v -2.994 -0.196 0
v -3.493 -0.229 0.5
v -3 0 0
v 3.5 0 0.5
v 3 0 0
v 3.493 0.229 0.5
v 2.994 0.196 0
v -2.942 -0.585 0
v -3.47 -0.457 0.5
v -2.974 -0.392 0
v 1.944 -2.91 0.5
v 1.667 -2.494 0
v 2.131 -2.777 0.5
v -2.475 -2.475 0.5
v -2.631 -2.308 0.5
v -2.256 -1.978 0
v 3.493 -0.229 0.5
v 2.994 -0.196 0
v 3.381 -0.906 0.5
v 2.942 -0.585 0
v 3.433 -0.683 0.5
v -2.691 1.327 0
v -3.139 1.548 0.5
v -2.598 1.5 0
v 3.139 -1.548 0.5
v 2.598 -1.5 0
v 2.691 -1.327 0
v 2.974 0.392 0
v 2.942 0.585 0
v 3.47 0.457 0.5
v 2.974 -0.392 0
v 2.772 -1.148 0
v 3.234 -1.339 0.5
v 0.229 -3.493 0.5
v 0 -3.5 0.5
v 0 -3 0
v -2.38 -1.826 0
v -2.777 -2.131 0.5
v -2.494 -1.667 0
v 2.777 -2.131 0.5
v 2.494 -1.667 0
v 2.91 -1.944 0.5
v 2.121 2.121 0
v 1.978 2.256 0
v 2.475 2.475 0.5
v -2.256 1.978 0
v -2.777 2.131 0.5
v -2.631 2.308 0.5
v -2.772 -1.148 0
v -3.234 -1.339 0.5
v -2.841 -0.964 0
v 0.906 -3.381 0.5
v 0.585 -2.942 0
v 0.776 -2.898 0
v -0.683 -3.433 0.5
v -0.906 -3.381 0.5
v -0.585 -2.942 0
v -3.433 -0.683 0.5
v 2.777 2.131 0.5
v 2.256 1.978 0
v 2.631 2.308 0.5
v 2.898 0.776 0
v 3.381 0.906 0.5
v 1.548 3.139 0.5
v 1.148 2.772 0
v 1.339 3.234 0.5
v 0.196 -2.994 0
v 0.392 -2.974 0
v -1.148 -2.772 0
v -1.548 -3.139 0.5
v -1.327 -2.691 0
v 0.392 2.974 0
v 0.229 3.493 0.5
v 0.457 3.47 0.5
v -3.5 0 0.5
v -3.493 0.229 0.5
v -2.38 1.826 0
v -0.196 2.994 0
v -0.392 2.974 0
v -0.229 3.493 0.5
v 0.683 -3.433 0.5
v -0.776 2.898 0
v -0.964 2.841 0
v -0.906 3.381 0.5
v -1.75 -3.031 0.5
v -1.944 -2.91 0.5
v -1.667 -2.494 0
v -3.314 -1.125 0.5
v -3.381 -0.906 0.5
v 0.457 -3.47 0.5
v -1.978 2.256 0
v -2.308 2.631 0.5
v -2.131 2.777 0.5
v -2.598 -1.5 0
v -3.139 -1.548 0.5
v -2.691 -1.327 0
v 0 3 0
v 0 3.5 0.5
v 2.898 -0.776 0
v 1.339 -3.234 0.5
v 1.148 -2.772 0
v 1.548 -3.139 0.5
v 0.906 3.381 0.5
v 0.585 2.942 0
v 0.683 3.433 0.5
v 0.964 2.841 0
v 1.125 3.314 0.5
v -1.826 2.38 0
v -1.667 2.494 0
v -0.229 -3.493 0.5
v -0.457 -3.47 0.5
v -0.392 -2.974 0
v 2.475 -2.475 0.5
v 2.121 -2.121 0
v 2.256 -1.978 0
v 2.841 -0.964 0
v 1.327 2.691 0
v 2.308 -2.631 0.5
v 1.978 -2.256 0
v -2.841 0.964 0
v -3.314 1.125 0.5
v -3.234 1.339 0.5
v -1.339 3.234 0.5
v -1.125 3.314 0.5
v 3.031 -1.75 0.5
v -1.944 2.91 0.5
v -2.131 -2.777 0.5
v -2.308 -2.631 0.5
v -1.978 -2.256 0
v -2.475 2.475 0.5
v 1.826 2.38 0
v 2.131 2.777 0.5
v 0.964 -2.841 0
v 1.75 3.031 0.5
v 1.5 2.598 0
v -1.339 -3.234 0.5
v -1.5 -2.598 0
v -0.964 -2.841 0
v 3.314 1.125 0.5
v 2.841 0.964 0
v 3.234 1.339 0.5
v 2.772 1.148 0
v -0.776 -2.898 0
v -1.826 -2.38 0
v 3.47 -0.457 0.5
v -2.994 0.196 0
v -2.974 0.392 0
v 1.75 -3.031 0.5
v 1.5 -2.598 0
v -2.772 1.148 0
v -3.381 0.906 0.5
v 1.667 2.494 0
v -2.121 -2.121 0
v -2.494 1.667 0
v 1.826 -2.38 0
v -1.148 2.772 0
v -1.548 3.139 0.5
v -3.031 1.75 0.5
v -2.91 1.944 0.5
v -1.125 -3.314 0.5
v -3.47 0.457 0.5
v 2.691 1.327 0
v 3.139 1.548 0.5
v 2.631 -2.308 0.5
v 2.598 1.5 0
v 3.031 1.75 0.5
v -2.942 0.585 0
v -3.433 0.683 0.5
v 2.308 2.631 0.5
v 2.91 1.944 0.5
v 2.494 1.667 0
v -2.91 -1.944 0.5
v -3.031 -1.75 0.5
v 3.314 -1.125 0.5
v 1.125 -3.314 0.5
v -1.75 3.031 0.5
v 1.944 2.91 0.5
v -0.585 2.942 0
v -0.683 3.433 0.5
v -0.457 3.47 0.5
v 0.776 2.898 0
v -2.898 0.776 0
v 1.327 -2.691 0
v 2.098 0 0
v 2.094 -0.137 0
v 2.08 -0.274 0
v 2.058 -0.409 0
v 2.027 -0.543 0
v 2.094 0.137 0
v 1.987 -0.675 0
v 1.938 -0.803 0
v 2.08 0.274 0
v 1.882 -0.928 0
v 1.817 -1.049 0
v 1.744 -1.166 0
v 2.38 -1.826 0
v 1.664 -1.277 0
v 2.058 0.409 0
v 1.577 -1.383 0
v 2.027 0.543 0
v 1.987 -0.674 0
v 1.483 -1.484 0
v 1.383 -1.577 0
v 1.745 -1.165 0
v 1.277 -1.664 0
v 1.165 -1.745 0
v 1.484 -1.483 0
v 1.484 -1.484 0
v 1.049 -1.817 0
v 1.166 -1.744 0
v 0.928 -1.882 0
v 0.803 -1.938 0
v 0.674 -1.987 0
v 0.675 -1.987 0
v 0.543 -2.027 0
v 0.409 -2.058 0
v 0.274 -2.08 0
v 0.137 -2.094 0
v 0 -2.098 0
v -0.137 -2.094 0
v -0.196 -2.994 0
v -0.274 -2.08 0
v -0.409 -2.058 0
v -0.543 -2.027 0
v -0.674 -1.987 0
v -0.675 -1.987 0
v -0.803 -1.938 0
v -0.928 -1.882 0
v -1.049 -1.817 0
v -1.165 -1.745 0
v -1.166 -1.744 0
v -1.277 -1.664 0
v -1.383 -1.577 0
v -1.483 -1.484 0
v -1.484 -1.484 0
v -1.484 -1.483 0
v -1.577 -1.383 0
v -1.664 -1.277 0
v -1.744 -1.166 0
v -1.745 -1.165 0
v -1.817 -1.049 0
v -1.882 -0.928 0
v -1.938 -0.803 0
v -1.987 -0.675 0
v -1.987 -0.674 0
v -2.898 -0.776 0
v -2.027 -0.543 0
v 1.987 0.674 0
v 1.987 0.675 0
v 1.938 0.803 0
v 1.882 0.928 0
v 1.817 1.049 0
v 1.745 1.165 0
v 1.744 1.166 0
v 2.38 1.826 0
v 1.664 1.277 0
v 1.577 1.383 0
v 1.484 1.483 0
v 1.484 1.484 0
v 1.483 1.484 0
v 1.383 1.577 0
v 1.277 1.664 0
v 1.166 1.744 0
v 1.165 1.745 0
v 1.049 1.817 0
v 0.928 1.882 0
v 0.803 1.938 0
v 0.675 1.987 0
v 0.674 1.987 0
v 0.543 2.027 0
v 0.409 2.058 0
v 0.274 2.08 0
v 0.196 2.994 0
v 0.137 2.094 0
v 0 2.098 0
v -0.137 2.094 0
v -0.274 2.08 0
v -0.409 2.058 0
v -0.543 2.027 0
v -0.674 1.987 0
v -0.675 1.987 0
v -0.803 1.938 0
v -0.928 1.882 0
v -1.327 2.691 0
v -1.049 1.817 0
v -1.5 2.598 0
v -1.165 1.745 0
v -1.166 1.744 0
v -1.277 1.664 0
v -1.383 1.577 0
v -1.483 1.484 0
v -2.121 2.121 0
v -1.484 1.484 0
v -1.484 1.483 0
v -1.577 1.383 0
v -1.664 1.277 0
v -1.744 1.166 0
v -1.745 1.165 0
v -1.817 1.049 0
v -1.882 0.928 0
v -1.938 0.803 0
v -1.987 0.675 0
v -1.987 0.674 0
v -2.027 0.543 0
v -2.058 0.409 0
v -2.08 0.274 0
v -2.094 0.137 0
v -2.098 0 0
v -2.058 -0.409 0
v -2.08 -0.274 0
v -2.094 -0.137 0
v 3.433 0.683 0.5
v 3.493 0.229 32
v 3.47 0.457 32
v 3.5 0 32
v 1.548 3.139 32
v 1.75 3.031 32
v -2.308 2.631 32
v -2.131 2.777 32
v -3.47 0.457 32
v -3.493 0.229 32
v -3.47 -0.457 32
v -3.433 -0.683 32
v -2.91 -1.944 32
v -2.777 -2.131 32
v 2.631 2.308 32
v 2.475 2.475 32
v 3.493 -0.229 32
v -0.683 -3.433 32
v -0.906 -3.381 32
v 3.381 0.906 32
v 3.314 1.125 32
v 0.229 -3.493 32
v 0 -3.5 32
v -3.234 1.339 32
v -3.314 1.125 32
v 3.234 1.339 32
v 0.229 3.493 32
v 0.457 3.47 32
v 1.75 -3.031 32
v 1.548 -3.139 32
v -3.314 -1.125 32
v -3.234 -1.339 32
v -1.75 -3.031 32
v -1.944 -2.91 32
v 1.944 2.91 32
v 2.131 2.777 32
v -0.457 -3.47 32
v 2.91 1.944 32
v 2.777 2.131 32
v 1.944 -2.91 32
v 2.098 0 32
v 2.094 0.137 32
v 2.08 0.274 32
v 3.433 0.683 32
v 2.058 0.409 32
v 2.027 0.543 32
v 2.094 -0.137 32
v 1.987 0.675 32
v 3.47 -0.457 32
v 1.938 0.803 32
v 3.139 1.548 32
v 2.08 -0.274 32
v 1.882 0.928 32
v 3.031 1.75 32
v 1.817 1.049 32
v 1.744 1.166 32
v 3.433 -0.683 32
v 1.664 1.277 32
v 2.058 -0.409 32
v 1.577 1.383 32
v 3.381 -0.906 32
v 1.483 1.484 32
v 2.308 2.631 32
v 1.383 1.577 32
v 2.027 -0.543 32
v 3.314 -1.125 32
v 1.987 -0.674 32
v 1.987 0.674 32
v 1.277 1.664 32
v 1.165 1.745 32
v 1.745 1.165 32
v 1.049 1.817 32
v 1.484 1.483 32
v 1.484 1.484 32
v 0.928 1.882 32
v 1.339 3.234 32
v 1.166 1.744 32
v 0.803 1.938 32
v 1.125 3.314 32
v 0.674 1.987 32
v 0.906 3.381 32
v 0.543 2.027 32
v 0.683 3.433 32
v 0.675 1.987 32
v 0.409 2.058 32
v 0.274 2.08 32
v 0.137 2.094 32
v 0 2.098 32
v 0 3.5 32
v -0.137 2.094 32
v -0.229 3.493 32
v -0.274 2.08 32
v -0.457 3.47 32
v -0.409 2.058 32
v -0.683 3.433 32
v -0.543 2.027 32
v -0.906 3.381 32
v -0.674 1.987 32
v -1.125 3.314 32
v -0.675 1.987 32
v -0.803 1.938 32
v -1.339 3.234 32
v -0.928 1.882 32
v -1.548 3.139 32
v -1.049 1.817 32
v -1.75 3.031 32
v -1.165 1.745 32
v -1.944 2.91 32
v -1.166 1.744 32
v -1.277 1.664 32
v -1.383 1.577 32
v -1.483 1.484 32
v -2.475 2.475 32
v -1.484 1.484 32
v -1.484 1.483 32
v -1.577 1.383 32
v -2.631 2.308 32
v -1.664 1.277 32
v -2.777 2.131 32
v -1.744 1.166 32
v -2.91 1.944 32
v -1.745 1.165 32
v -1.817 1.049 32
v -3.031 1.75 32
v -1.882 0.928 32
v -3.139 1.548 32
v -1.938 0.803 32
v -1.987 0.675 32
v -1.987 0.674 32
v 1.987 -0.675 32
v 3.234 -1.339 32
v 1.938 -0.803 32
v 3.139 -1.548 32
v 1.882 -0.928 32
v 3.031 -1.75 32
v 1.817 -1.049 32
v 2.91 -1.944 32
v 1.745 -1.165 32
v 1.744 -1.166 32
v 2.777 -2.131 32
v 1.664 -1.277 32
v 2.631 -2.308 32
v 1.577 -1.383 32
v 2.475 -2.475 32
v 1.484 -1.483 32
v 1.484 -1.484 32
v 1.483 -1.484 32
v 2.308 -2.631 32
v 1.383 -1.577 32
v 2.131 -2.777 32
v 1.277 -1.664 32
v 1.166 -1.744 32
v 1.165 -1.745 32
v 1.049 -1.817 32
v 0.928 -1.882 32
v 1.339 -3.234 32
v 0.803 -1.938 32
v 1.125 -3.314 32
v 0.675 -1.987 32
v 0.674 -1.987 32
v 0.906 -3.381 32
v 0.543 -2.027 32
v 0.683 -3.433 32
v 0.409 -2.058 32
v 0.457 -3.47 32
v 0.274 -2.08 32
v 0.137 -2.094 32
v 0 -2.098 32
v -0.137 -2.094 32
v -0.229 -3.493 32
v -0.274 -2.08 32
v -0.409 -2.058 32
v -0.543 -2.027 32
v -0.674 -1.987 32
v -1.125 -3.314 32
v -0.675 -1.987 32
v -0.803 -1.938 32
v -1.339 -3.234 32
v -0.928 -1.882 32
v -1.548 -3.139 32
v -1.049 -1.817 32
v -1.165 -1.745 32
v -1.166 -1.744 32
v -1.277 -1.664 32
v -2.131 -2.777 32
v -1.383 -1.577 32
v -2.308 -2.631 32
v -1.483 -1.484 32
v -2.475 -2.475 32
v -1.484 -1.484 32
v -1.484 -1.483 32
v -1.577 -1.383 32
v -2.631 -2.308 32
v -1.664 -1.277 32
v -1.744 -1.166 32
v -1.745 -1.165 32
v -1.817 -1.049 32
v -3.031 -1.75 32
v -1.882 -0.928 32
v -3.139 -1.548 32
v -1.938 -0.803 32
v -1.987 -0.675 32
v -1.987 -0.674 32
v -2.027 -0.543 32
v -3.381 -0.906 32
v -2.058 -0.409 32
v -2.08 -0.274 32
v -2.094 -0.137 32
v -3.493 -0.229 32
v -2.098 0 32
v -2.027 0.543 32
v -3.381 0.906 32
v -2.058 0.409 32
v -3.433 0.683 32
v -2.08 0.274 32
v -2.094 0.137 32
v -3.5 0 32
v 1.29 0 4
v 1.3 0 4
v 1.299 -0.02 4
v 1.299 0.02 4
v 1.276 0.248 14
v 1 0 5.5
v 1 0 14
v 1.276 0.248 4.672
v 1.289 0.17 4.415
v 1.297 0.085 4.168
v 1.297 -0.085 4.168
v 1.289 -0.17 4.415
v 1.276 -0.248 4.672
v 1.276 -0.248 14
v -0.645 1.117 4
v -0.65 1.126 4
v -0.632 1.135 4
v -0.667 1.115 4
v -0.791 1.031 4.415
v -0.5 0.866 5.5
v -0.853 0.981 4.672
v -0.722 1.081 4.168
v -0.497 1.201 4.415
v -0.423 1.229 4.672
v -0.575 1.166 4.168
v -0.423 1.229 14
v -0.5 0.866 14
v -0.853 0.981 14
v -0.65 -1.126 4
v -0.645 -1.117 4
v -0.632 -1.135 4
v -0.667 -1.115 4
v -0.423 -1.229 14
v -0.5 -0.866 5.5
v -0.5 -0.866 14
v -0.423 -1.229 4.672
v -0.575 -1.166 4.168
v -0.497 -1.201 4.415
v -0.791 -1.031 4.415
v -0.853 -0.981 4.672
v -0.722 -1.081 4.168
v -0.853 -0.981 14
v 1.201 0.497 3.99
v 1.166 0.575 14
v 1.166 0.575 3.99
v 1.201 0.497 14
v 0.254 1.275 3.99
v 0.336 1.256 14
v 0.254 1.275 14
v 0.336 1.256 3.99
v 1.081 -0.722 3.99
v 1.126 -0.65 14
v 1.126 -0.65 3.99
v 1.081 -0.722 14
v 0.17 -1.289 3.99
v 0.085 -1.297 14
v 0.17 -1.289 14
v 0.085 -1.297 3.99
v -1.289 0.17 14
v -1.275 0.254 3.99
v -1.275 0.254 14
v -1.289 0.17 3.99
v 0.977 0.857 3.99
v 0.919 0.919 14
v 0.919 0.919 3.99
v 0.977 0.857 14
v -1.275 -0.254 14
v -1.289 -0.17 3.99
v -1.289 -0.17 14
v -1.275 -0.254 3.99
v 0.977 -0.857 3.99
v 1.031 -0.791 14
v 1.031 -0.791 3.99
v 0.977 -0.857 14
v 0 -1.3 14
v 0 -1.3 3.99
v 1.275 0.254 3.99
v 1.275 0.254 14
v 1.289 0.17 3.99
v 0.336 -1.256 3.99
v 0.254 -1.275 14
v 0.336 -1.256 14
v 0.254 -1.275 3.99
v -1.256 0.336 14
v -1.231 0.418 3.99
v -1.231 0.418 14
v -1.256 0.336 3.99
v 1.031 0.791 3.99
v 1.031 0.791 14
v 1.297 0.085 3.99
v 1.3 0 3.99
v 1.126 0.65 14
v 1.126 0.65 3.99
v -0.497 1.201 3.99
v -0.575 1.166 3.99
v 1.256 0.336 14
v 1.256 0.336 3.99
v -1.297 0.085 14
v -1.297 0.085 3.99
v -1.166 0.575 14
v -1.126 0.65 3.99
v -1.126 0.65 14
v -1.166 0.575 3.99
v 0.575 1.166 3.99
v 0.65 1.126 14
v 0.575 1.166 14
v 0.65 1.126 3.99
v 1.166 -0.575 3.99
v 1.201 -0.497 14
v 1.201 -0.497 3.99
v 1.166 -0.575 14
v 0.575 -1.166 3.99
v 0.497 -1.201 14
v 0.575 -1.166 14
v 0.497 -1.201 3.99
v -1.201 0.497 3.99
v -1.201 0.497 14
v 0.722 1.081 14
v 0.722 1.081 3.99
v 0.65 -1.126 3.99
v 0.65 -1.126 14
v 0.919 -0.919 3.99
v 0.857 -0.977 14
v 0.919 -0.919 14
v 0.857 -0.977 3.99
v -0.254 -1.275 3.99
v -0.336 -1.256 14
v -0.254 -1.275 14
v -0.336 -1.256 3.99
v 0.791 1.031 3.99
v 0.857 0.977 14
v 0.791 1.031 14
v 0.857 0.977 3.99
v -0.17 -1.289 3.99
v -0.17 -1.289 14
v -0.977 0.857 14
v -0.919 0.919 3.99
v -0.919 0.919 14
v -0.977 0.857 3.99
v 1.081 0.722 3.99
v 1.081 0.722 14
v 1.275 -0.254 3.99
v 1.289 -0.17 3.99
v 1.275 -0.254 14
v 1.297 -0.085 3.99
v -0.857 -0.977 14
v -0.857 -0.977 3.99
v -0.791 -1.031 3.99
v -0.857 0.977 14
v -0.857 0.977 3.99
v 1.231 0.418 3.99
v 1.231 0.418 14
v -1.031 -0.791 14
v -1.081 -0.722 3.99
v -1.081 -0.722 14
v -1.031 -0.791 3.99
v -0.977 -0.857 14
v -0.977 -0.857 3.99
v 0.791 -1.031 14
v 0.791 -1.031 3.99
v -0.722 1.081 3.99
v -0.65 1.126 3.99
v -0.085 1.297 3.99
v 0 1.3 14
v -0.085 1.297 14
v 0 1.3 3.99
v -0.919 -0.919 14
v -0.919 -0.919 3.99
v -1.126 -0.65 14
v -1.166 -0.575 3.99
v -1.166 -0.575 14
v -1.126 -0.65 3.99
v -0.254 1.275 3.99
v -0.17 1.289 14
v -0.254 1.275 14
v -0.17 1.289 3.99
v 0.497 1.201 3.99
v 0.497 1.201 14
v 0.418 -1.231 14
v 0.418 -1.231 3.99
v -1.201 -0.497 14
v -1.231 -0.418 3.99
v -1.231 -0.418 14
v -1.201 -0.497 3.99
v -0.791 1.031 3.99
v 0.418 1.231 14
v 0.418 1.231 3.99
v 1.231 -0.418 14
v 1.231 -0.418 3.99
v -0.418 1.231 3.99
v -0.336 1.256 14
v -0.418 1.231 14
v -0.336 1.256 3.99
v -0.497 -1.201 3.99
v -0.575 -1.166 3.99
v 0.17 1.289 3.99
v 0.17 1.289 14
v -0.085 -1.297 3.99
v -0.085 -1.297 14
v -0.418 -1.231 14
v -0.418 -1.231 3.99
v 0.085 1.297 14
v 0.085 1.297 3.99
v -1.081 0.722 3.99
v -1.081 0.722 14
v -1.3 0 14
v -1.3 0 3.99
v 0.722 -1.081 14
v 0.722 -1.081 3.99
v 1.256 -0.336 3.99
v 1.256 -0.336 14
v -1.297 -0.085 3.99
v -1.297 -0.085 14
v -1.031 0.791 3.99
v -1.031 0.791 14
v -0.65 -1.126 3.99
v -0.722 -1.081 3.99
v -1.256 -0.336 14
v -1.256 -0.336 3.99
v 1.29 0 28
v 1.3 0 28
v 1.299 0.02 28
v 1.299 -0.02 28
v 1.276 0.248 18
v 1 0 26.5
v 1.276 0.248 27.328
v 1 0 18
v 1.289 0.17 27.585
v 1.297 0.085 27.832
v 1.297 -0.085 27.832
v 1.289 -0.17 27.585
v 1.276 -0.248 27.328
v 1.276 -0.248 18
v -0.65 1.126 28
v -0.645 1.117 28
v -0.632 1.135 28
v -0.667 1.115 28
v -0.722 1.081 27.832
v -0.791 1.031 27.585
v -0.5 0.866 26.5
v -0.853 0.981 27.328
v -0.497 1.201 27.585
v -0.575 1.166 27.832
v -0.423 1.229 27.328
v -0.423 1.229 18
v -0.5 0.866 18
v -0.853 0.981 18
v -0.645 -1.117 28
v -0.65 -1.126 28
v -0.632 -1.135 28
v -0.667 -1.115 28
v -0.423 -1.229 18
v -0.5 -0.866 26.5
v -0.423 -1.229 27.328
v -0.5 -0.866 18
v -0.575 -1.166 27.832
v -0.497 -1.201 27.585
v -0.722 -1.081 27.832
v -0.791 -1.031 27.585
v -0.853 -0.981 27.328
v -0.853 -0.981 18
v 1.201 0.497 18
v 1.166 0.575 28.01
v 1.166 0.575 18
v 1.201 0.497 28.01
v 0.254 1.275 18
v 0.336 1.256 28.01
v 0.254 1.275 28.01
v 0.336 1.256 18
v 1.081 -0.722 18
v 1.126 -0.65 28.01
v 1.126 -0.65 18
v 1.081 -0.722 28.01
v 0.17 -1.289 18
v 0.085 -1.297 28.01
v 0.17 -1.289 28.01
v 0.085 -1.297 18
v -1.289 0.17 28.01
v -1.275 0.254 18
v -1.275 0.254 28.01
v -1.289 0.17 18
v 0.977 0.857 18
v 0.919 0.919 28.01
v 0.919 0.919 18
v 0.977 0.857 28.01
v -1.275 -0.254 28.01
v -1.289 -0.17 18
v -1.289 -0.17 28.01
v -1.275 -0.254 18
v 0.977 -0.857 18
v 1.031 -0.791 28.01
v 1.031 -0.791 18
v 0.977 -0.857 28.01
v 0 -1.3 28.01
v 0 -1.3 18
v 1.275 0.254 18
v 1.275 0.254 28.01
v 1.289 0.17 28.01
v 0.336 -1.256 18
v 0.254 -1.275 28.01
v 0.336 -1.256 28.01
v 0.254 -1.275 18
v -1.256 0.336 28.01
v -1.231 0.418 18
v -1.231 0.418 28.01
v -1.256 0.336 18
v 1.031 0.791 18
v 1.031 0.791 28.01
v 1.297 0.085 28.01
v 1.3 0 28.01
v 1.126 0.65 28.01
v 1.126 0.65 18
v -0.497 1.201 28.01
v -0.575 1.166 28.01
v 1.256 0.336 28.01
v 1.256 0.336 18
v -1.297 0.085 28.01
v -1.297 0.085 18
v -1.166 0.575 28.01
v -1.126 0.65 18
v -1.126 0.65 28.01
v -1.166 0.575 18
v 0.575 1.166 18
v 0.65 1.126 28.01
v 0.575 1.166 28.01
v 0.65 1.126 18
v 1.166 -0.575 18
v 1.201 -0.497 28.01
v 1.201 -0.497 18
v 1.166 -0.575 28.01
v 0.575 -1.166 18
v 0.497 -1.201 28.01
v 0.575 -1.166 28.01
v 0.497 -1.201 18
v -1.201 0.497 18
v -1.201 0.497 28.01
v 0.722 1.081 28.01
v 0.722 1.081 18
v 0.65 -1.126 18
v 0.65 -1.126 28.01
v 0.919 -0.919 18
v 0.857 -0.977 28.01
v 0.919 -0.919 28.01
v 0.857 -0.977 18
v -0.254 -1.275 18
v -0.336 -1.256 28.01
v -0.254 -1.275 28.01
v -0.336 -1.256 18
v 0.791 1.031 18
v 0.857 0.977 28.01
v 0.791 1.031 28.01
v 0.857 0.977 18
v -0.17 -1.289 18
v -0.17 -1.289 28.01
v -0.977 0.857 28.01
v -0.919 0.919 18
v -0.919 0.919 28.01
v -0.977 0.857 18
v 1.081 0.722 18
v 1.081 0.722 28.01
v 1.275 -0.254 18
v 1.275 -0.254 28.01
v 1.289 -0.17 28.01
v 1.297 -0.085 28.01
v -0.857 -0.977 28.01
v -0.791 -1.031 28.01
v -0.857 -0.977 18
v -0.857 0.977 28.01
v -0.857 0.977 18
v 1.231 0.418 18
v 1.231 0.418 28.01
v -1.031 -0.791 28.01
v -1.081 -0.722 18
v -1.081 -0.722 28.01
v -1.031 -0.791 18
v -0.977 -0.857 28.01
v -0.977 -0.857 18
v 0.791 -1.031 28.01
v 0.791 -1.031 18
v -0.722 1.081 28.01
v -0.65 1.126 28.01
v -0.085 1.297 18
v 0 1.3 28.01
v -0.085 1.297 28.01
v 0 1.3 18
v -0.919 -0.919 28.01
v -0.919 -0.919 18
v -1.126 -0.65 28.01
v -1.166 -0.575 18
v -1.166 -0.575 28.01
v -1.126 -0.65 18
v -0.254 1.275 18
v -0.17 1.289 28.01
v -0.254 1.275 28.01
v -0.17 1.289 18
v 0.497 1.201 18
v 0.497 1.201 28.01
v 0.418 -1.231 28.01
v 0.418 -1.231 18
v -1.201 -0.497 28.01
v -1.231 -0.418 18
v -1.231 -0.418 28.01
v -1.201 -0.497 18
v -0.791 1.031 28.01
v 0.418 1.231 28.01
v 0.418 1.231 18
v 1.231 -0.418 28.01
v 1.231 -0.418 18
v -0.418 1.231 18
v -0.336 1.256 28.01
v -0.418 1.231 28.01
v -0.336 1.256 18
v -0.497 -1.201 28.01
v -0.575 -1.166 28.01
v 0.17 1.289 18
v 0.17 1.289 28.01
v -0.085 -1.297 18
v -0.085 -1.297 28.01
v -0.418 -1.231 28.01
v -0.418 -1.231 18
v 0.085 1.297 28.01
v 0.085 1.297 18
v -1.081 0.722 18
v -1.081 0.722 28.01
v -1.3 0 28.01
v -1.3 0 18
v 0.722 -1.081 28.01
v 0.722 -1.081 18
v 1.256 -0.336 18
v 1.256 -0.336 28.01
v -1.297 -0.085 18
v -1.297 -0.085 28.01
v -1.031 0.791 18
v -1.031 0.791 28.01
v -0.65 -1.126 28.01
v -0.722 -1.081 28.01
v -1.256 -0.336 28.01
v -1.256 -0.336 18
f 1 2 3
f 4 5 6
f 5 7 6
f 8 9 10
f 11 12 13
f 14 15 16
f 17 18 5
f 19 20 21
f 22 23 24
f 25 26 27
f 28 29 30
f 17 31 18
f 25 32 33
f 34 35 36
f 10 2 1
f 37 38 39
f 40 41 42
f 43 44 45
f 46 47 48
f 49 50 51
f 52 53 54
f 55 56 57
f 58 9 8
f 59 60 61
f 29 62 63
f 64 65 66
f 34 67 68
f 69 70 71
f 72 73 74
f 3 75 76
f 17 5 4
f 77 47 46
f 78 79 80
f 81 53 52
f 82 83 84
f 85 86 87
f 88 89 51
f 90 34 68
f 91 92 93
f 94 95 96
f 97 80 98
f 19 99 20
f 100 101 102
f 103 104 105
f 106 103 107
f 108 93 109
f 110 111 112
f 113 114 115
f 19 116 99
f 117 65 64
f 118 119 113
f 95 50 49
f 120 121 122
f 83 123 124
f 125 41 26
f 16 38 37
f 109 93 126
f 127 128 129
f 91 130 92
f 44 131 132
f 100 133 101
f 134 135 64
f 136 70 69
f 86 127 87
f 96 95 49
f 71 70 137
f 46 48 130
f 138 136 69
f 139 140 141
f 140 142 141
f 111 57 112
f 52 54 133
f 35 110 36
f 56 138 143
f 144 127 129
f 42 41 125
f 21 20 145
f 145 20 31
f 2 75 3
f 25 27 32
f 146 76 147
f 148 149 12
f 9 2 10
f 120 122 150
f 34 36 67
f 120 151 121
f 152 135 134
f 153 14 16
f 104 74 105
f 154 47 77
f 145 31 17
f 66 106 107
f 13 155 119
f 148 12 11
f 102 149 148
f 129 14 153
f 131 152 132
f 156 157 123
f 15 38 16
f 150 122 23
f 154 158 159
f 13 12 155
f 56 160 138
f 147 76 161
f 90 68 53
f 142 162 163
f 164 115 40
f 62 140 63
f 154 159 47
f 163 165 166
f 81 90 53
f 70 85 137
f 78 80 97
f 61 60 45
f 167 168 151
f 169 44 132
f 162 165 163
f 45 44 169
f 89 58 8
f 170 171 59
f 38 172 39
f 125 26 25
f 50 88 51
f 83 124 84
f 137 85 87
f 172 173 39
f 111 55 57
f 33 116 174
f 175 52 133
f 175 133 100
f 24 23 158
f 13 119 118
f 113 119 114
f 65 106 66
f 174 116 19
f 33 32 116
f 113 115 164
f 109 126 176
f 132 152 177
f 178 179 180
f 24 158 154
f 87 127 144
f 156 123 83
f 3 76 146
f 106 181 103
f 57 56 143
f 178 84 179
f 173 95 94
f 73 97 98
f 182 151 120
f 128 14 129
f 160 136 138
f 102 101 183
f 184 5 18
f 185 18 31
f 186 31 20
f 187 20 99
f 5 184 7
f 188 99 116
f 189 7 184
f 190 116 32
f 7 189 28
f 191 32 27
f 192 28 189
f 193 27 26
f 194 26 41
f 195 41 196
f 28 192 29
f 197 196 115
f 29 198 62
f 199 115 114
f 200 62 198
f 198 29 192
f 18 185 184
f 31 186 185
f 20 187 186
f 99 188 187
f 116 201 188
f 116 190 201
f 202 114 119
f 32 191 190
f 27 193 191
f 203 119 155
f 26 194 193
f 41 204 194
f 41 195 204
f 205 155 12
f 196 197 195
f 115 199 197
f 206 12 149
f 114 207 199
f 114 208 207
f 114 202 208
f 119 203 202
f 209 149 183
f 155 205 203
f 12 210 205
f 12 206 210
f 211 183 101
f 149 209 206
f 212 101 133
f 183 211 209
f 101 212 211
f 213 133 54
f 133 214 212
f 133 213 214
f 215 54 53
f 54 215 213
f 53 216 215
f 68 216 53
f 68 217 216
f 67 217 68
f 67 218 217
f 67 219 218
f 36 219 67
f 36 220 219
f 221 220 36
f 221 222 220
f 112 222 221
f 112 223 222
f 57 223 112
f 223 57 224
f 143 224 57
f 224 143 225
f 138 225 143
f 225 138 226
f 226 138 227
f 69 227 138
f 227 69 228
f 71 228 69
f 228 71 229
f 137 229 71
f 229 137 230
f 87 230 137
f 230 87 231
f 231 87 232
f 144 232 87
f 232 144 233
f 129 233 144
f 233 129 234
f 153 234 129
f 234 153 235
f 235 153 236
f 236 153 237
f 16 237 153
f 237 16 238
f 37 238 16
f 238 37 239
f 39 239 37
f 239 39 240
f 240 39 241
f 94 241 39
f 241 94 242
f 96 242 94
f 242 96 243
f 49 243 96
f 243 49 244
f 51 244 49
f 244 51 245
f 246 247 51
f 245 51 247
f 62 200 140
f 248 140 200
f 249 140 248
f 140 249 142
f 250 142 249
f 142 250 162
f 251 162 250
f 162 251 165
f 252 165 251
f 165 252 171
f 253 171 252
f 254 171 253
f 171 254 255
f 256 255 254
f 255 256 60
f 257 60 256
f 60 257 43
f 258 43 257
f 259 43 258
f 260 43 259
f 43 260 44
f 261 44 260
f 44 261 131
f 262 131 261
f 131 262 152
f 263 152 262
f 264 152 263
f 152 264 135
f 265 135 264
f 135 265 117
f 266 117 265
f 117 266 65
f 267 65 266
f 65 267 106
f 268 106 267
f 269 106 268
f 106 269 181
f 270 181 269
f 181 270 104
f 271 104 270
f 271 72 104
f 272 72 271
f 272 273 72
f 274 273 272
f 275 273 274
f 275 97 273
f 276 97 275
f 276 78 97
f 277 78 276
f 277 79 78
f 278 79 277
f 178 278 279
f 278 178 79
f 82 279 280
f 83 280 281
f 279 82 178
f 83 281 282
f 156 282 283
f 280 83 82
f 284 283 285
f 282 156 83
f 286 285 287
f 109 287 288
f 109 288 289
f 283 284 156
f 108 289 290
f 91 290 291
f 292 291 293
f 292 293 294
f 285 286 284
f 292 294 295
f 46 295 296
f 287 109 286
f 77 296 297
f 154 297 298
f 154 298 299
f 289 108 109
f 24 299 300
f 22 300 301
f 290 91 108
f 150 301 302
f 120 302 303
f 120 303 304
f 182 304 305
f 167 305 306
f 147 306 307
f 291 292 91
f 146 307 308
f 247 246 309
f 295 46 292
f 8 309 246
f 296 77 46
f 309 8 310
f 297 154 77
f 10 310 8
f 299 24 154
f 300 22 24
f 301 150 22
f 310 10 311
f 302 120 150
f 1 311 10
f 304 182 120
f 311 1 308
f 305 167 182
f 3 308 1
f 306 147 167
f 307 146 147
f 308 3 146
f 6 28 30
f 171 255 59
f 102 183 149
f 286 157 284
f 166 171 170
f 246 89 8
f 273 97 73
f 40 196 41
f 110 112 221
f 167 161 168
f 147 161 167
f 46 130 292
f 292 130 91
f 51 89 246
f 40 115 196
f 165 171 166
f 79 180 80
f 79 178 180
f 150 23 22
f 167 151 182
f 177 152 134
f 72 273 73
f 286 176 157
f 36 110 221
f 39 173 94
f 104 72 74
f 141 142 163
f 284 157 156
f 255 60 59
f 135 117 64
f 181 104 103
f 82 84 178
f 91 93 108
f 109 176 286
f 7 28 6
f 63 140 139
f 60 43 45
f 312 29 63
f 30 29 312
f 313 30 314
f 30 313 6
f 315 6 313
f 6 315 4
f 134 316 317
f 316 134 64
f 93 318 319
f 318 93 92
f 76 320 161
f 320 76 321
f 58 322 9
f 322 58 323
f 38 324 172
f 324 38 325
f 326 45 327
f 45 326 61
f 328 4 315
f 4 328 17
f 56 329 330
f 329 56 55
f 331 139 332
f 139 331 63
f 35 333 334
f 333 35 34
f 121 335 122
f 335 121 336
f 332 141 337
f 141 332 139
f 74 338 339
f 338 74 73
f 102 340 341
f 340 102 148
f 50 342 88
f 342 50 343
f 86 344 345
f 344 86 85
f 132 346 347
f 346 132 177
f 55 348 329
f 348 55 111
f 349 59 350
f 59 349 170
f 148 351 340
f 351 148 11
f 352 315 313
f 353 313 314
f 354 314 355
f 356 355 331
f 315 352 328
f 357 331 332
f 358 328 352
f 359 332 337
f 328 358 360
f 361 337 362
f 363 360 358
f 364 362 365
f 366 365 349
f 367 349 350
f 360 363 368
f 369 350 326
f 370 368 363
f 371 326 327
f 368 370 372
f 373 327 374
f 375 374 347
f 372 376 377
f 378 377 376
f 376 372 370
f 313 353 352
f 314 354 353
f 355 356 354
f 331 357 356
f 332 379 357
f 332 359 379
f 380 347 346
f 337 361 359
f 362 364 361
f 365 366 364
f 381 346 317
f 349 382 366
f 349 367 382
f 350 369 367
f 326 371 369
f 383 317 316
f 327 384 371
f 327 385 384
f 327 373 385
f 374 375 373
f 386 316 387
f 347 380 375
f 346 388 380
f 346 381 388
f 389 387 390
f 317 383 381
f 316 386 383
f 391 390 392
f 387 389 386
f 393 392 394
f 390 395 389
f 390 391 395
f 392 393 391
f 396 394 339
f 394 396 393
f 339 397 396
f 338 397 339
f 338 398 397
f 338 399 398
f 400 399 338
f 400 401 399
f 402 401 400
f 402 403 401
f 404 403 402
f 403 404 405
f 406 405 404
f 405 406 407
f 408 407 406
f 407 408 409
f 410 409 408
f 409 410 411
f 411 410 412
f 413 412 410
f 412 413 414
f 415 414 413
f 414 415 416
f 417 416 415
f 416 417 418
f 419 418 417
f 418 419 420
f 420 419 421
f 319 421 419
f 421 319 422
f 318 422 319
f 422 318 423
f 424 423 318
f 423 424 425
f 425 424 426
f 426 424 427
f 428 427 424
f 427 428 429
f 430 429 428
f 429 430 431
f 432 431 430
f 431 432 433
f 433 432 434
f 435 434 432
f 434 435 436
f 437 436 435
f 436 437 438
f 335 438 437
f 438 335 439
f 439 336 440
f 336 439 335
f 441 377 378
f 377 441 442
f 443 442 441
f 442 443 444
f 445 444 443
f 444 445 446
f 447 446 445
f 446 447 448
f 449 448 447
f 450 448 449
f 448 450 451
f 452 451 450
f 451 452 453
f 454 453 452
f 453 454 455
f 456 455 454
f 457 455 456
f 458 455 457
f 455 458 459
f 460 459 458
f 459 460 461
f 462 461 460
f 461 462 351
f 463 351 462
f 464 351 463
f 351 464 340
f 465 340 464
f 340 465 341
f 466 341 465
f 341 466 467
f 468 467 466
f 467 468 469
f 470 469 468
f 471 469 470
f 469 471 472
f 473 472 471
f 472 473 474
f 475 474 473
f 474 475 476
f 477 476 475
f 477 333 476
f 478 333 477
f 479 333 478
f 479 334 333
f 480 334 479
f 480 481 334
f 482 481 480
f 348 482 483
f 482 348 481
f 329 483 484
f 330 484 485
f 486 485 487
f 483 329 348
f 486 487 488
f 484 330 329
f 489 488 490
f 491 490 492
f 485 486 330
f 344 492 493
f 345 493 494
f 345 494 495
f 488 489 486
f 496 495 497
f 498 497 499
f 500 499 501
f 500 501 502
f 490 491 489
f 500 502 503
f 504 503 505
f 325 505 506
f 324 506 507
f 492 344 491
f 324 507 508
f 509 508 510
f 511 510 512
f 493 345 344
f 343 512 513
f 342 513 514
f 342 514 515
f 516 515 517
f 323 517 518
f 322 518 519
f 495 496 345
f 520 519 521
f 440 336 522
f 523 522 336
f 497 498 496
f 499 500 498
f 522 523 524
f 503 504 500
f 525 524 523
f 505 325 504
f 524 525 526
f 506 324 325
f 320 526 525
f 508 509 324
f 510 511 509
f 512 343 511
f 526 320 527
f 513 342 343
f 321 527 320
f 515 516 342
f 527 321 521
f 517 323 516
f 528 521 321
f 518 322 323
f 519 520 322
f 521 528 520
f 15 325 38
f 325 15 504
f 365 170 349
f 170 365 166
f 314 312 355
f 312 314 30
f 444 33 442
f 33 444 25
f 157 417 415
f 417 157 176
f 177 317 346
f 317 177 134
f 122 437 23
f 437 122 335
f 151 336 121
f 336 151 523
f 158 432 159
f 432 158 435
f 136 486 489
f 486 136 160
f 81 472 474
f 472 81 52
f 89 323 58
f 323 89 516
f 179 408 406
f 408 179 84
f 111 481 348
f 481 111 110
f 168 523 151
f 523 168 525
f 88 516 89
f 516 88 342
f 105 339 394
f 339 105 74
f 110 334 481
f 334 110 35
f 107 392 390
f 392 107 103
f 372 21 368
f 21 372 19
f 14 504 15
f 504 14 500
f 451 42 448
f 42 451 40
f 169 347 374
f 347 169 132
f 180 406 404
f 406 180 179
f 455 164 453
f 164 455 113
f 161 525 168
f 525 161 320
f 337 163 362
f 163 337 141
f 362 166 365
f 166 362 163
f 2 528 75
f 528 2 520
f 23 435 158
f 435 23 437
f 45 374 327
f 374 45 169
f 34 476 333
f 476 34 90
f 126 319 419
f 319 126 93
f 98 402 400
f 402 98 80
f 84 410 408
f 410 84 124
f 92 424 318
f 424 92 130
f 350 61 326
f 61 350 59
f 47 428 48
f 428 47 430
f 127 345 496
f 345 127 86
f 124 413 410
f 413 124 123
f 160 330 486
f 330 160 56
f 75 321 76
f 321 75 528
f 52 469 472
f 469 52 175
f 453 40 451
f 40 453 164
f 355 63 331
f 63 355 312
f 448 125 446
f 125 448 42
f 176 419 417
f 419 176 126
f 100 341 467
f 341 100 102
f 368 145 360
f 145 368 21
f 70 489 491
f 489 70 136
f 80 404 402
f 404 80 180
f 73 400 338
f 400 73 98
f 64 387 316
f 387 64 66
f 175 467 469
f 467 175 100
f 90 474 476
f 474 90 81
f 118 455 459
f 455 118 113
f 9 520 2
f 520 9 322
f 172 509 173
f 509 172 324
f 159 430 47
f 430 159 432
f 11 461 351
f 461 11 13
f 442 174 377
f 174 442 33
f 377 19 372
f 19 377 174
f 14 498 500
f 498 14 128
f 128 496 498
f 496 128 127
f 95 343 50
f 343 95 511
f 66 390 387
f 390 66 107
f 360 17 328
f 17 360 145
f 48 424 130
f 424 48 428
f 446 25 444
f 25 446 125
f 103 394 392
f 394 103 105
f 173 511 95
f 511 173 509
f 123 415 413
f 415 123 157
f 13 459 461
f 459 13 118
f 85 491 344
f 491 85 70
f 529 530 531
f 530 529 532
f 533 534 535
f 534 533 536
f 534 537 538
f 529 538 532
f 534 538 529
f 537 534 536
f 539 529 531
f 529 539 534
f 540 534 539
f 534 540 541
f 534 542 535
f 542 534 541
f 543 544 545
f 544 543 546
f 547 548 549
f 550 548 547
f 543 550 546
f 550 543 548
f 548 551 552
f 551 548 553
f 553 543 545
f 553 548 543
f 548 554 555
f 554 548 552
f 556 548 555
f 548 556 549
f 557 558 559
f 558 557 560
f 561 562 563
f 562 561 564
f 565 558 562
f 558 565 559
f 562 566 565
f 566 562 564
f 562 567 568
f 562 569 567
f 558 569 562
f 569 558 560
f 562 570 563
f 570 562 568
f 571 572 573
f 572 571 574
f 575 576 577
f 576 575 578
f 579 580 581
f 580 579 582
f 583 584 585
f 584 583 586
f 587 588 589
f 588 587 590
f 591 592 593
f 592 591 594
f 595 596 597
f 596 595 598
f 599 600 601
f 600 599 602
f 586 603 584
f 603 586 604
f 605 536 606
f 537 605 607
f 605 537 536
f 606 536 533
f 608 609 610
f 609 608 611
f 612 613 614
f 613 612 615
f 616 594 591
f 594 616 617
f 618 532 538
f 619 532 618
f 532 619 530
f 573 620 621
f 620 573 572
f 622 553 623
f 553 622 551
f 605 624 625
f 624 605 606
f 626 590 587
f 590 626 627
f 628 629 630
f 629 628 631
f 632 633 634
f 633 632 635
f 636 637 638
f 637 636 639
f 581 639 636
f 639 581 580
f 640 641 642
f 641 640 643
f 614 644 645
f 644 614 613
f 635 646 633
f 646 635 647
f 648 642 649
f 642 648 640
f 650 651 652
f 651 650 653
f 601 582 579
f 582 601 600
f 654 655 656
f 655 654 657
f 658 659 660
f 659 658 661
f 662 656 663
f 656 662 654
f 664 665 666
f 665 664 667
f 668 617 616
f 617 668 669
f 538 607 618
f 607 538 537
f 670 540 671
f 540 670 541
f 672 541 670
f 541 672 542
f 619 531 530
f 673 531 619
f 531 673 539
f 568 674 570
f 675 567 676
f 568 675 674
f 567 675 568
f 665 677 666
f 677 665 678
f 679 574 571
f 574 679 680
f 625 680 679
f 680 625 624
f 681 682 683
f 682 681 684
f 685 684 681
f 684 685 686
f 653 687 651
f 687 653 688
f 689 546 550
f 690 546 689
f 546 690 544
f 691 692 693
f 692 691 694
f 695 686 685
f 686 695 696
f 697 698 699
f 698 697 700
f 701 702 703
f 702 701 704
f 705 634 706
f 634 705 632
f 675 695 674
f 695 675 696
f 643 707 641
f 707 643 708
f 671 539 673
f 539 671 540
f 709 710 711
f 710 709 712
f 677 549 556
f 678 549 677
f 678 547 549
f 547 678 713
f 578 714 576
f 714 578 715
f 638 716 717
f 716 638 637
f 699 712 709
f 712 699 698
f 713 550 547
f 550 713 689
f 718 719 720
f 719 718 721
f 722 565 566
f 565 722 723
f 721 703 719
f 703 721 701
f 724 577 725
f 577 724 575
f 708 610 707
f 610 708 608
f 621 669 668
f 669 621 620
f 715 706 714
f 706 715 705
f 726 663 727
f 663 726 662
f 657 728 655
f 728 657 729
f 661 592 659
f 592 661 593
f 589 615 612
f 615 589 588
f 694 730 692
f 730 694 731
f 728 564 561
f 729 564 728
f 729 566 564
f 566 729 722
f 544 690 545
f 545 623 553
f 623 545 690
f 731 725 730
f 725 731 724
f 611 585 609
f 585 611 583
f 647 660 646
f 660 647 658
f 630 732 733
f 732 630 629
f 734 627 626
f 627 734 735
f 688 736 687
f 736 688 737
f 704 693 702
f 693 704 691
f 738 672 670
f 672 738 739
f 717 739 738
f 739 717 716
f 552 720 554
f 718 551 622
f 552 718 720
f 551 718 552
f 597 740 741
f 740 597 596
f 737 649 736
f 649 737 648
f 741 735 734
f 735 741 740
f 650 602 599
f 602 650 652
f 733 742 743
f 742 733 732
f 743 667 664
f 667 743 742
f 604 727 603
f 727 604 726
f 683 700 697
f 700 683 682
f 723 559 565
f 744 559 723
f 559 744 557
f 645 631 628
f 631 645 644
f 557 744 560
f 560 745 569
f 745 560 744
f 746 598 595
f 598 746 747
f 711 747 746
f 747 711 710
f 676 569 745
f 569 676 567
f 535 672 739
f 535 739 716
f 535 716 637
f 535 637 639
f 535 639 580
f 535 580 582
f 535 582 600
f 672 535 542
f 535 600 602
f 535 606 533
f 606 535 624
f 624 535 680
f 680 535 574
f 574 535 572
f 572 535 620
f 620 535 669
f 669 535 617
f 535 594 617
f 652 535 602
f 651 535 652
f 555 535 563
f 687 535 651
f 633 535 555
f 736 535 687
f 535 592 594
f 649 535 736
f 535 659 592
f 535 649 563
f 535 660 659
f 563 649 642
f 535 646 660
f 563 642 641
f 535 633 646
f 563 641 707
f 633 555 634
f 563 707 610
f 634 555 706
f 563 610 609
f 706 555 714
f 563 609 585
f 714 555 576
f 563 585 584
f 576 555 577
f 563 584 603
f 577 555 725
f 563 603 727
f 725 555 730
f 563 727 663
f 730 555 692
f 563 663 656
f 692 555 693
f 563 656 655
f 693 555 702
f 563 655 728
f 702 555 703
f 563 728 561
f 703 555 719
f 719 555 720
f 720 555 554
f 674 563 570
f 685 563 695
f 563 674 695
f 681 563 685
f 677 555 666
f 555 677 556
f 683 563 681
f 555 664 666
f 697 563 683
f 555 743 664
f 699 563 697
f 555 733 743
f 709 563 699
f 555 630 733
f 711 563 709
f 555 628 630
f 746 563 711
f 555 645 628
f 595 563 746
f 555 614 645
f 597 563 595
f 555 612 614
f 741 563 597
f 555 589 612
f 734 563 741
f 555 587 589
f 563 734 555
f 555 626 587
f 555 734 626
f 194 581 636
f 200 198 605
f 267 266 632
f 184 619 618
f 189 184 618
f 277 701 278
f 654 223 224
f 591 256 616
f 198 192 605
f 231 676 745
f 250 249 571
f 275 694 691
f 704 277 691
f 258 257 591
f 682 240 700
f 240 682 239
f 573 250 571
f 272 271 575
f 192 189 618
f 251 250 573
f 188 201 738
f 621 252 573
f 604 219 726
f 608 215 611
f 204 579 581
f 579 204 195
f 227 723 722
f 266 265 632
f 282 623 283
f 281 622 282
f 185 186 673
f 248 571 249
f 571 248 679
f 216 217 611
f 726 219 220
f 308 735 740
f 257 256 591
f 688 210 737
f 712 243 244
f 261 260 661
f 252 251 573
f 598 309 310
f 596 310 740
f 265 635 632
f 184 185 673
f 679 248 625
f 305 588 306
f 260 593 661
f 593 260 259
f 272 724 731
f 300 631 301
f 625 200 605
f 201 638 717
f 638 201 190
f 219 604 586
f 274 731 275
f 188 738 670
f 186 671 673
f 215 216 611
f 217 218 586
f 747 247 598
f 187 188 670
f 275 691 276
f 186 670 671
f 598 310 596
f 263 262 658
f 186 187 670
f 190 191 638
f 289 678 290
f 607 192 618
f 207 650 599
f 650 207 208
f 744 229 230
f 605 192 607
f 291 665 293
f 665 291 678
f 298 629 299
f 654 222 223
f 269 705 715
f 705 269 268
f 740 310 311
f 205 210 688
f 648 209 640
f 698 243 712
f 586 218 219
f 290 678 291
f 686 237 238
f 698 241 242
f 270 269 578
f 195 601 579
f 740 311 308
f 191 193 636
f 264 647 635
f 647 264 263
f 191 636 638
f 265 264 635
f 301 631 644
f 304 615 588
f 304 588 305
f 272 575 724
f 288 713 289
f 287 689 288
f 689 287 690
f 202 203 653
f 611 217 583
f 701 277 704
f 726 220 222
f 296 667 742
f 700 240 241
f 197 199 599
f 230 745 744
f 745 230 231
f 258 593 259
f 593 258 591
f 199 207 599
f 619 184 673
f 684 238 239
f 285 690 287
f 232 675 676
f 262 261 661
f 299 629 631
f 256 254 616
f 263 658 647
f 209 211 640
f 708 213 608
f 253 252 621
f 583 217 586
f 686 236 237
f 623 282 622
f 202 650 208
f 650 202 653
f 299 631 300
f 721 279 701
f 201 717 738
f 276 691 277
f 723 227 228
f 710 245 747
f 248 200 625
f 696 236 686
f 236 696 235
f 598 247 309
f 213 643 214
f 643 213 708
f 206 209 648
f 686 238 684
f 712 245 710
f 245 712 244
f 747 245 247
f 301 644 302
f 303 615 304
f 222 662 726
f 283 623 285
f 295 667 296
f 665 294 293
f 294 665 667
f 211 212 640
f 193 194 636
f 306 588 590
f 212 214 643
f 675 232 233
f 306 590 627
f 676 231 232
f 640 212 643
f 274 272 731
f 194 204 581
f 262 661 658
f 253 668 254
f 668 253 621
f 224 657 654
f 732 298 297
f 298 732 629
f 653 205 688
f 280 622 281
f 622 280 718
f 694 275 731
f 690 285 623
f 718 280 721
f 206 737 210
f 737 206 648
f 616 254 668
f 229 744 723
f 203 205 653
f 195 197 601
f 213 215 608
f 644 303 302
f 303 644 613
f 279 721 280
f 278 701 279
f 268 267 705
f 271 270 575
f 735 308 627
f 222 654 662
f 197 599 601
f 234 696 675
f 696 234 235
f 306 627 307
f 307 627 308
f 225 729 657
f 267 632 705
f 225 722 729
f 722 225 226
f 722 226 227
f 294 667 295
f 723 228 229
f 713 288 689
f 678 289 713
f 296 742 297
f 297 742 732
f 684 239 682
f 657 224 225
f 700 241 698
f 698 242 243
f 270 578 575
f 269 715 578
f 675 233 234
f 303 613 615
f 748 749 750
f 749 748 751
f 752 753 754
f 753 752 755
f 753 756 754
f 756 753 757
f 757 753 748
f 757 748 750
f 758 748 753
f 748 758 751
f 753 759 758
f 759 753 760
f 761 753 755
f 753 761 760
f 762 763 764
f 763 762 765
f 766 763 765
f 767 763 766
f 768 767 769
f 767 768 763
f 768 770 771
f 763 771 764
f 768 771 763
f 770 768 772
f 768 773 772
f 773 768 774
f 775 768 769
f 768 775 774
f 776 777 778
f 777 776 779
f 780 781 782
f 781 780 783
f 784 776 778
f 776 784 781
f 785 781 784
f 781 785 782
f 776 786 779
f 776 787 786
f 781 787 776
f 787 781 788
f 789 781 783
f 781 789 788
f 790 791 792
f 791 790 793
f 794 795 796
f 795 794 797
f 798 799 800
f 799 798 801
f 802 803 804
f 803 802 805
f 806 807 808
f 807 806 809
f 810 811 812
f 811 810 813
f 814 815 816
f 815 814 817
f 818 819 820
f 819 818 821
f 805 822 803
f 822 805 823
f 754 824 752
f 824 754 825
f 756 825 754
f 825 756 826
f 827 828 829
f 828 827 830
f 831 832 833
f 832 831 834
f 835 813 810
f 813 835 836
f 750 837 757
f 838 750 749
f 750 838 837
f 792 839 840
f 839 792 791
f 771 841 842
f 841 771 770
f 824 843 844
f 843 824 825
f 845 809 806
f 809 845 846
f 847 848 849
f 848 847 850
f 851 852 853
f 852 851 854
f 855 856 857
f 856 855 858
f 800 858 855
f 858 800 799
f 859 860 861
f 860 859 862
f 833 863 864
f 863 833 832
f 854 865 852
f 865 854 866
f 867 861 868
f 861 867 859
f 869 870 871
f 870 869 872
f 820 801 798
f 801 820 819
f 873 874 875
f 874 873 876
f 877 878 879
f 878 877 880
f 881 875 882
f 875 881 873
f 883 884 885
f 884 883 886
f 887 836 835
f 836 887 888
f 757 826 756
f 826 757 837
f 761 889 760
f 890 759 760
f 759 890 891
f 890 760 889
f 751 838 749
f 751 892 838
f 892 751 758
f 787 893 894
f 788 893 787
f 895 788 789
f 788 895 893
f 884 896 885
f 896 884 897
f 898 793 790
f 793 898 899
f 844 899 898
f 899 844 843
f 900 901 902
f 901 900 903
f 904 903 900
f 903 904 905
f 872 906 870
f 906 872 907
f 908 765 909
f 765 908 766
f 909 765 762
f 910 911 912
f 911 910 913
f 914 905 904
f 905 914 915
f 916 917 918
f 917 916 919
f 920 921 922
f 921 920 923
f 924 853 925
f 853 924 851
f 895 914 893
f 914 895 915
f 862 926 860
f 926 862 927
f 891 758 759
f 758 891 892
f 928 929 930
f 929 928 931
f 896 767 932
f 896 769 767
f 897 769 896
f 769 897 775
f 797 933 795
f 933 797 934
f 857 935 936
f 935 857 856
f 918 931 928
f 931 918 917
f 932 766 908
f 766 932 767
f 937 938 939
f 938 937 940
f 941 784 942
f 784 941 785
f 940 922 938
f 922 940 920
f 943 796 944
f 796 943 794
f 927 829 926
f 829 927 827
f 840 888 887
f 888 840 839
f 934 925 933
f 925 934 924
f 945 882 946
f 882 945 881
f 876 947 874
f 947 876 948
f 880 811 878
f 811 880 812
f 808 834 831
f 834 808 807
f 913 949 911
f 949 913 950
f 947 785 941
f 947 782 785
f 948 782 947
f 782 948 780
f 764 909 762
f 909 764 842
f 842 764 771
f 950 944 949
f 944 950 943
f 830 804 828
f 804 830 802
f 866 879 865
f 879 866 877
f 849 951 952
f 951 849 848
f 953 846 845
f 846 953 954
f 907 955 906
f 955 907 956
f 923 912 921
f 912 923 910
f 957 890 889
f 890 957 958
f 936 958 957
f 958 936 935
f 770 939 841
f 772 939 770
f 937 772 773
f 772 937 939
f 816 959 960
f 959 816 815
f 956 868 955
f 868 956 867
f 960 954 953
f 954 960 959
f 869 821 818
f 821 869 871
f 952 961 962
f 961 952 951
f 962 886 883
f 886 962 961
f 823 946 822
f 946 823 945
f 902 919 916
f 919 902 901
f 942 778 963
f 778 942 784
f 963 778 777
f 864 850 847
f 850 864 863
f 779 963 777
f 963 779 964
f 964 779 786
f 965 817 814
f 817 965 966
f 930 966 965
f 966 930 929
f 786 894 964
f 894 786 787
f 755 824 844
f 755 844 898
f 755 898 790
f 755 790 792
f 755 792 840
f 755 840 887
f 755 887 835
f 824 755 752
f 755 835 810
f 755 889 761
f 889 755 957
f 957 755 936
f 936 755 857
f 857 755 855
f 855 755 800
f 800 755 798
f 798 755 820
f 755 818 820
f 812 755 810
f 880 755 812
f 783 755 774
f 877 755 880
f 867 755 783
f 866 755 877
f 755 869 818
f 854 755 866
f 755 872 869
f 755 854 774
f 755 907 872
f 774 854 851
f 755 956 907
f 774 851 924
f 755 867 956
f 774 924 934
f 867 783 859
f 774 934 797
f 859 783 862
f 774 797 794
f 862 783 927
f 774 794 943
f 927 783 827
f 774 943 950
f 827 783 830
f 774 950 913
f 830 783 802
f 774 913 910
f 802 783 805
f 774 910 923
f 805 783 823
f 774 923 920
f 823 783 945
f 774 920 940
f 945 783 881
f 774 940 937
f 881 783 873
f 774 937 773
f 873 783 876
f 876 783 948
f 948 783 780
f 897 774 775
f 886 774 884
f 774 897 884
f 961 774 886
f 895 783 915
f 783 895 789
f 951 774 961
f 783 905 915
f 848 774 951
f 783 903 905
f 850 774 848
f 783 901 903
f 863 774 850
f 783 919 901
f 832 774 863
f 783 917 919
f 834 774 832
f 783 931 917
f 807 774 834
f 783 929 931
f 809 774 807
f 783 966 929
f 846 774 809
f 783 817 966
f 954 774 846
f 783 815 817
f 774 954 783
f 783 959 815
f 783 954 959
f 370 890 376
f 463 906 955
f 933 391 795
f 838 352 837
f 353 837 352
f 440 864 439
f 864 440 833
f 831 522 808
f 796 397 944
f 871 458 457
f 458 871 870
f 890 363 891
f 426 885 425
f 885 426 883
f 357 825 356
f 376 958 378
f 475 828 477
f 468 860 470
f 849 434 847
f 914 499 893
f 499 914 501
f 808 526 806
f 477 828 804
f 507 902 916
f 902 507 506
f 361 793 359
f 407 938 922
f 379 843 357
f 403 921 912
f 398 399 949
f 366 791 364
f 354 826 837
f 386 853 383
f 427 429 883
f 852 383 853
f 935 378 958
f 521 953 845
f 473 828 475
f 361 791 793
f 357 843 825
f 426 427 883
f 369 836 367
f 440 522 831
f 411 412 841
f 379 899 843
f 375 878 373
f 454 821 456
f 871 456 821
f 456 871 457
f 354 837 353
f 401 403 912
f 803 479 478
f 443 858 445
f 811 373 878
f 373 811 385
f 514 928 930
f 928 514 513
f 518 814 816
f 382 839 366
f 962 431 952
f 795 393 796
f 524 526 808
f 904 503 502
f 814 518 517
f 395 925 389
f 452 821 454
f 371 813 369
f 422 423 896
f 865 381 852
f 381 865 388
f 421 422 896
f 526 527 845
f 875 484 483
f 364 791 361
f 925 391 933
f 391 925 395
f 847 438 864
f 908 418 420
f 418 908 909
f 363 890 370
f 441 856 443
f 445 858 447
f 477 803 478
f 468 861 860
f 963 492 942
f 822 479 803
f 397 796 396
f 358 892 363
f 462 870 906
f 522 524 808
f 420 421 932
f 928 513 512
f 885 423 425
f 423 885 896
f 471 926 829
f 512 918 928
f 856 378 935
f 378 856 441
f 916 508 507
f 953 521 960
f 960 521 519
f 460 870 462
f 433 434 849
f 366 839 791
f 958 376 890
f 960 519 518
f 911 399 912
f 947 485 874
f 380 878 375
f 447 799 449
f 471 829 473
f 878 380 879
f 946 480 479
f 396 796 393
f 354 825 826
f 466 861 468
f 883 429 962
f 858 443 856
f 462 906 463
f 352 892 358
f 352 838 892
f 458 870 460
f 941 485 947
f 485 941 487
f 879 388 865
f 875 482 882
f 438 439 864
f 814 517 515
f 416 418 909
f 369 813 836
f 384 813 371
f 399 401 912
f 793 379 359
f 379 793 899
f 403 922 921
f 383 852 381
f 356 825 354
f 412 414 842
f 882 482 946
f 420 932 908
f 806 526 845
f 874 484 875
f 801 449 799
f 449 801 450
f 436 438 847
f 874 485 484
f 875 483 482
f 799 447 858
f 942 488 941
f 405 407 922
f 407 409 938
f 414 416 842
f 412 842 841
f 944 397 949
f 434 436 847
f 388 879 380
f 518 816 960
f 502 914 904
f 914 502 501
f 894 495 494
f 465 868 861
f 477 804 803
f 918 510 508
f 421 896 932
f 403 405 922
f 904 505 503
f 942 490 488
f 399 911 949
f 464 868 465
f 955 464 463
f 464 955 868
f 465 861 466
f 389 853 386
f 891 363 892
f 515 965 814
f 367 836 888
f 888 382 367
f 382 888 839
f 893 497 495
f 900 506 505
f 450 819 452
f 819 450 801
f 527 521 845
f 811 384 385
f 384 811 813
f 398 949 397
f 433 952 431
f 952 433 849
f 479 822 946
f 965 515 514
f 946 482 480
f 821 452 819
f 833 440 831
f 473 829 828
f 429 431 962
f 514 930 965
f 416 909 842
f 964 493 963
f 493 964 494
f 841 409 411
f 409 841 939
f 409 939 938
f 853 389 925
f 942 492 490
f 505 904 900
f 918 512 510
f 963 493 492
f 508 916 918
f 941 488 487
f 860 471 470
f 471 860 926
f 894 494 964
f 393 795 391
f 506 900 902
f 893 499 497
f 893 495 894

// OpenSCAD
// Coupler v5: joins the 2 mm motor shaft to the 2 mm steel prop rod (long-tail boat).
// Built for Joe's printer: FlashForge Adventurer 5M, 0.4 mm nozzle, printed STANDING UP.
//
// Why it looks like this (2026-10-29 - the plain 10 mm tube was slow and mostly zigzag infill):
//  * CRUSH RIBS, not a tight round hole. The hole is drawn loose (2.6) and 3 thin ribs reach in to
//    grip the rod. Pushing the rod in shaves the ribs to fit, so it grips even when the printer
//    makes holes a bit big or small. That ends the 2.0/2.1/2.2/2.4 guessing in the fit history
//    in shaft_coupler.scad: a rib can be shaved, a solid wall can't.
//  * 7 mm across. The wall is ~2.2 mm, about 5 lines of a 0.4 nozzle, so the slicer prints it
//    all as solid walls (strongest, no zigzag infill). The motor is tiny, so a thicker part
//    only adds print time.
//  * Solid 4 mm in the middle, no pin-hole vent: the strongest spot, where the two shafts meet.
//  * A funnel at each end so the rod finds the hole, and a chamfer at the bottom so the first
//    layer's squish doesn't make a lip.
//
// Render: tmp/openscad-2021.01/openscad.com --export-format binstl -o media/3d/coupler_v5.stl 3d/coupler_v5.scad

od        = 7;      // outside diameter
length    = 32;     // total length
depth     = 14;     // how far each shaft goes in
clear_d   = 2.6;    // loose hole the rod sits in (it never touches this)
rib_tip_d = 2.0;    // circle through the rib tips (smaller = tighter grip)
ribs      = 3;
rib_w     = 0.9;    // rib width where it meets the wall
flare_d   = 4.2;    // funnel width at the mouth
flare_h   = 4;      // funnel depth
ramp      = 1.5;    // ribs rise over this length so the rod doesn't stub on them
chamfer   = 0.5;
$fn = 96;

module rib_2d(tip_r) {
    // thin wedge from the wall (r = clear_d/2 + 0.2, overlapping it) in to tip_r
    polygon([[clear_d / 2 + 0.2, -rib_w / 2], [clear_d / 2 + 0.2, rib_w / 2], [tip_r, 0]]);
}

// one socket from the mouth (z=0) inward
module socket() {
    // funnel into the loose hole
    translate([0, 0, -0.01]) cylinder(d1 = flare_d, d2 = clear_d, h = flare_h);
    difference() {
        translate([0, 0, flare_h - 0.02]) cylinder(d = clear_d, h = depth - flare_h + 0.02);
        for (i = [0 : ribs - 1]) rotate(i * 360 / ribs)
            hull() {
                translate([0, 0, flare_h]) linear_extrude(0.01) rib_2d(clear_d / 2 - 0.01);
                translate([0, 0, flare_h + ramp]) linear_extrude(depth - flare_h - ramp + 0.1)
                    rib_2d(rib_tip_d / 2);
            }
    }
}

difference() {
    union() {
        cylinder(d1 = od - 2 * chamfer, d2 = od, h = chamfer);
        translate([0, 0, chamfer]) cylinder(d = od, h = length - chamfer);
    }
    socket();
    translate([0, 0, length]) mirror([0, 0, 1]) socket();
}
